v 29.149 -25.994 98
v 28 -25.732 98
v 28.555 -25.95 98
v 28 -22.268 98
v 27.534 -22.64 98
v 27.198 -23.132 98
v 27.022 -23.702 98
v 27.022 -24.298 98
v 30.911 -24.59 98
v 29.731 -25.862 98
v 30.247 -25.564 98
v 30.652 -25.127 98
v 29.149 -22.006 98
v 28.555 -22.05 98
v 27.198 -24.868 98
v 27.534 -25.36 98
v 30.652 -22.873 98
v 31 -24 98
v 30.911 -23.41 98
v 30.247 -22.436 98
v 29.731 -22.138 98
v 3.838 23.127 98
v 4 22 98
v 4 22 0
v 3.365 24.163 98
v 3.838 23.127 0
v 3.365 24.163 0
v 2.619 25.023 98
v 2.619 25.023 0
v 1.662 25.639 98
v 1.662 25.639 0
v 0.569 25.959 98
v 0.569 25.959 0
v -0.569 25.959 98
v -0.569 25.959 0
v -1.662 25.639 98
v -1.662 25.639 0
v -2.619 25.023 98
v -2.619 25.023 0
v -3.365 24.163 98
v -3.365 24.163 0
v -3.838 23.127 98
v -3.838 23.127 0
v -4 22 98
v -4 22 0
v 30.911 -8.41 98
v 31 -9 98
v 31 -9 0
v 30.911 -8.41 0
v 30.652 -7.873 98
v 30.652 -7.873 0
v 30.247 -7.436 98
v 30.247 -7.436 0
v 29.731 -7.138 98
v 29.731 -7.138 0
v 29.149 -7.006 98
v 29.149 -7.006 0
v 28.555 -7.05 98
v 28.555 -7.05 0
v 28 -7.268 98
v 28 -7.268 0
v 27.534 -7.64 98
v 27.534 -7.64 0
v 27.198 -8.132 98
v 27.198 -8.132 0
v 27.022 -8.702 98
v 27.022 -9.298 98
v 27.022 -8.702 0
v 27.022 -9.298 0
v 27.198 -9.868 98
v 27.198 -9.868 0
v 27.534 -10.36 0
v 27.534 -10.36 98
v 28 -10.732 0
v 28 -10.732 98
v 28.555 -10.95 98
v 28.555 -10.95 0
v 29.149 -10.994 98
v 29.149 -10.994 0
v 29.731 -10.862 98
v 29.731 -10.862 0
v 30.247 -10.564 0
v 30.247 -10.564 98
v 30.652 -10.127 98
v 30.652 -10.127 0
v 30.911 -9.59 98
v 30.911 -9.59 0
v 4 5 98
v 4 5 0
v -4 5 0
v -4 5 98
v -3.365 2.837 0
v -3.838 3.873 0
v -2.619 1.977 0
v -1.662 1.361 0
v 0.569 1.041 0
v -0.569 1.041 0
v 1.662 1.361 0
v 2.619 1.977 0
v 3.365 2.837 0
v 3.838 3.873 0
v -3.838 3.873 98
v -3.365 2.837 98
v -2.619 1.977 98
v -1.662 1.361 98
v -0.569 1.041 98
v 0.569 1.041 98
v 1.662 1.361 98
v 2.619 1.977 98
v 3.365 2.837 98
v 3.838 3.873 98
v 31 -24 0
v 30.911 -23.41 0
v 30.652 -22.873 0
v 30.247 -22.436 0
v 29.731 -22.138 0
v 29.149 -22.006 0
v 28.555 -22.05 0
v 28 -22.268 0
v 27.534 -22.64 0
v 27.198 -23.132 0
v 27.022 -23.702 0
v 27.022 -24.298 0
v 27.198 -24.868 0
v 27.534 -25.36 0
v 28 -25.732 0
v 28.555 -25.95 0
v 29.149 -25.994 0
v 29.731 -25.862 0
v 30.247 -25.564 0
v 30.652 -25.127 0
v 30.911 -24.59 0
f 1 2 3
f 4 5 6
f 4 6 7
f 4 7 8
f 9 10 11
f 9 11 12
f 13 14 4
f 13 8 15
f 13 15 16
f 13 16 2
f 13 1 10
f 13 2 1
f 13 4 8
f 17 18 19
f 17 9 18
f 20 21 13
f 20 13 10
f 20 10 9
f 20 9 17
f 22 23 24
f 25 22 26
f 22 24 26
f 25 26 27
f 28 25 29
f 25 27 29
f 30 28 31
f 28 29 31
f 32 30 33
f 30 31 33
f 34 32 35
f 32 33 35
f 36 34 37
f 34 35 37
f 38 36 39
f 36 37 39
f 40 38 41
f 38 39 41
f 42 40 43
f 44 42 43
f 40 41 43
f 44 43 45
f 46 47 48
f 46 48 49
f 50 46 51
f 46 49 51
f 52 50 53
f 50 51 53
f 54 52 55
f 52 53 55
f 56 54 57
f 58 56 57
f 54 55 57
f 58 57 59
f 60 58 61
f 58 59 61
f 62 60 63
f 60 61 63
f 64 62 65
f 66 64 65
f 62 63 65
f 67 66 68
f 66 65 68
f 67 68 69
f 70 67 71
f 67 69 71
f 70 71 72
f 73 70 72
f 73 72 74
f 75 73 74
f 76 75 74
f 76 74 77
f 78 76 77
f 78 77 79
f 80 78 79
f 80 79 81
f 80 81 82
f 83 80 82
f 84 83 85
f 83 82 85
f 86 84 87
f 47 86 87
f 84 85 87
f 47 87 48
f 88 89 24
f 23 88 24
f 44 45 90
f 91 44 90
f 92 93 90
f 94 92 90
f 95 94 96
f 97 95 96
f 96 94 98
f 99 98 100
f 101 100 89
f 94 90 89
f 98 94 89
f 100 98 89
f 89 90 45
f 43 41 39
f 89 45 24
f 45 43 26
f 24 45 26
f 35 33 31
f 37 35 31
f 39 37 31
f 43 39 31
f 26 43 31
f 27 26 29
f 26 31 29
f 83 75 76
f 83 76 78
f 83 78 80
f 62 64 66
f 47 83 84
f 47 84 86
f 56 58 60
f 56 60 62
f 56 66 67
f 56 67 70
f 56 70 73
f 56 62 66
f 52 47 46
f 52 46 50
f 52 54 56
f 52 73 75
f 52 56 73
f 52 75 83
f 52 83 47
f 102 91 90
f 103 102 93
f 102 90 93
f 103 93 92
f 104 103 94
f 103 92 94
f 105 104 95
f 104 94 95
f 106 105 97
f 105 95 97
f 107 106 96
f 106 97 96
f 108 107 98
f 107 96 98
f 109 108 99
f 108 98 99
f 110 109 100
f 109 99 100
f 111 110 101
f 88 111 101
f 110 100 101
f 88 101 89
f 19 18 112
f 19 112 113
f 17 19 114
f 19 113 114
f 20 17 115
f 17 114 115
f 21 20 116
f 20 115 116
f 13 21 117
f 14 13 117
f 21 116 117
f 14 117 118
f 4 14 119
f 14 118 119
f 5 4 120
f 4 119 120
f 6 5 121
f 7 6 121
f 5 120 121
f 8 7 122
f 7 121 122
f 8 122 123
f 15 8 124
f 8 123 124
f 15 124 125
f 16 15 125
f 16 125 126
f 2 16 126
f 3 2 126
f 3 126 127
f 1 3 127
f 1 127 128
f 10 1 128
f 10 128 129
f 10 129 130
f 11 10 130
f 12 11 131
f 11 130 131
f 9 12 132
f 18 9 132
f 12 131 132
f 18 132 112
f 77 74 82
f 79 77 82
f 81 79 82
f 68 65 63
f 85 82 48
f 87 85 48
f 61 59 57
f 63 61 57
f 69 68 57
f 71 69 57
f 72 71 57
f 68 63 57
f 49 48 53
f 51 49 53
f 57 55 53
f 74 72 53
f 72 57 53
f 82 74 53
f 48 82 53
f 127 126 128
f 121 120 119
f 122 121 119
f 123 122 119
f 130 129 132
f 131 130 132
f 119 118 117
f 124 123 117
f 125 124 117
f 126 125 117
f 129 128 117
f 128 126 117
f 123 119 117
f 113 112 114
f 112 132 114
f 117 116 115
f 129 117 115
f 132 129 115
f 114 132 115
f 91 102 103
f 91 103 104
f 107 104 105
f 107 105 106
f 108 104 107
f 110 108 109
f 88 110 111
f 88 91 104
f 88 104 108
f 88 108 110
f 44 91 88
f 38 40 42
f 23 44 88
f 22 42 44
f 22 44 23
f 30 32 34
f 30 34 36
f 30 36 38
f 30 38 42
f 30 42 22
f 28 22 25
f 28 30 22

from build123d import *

# Parameters (mm, degrees)
SKETCH2_R             = 2
BOSS_EXTRUDE1_DEPTH   = 98
BOSS_EXTRUDE1_2_DEPTH = 98
BOSS_EXTRUDE1_3_DEPTH = 98


with BuildPart() as part:
    # Sketch2 → Boss-Extrude1 (new body)
    with BuildSketch(Plane.XY):
        with Locations((29, -9)):
            Circle(SKETCH2_R)
    extrude(amount=BOSS_EXTRUDE1_DEPTH)


with BuildPart() as body_2:
    # Sketch2 → Boss-Extrude1 2 (new body)
    with BuildSketch(Plane.XY):
        with Locations((29, -24)):
            Circle(SKETCH2_R)
    extrude(amount=BOSS_EXTRUDE1_2_DEPTH)


with BuildPart() as body_3:
    # Sketch2 → Boss-Extrude1 3 (new body)
    with BuildSketch(Plane.XY):
        with BuildLine():
            Line((4, 5), (4, 22))
            ThreePointArc((4, 22), (0, 26), (-4, 22))
            Line((-4, 22), (-4, 5))
            ThreePointArc((-4, 5), (0, 1), (4, 5))
        make_face()
    extrude(amount=BOSS_EXTRUDE1_3_DEPTH)


solid = Compound([part.part, body_2.part, body_3.part])
